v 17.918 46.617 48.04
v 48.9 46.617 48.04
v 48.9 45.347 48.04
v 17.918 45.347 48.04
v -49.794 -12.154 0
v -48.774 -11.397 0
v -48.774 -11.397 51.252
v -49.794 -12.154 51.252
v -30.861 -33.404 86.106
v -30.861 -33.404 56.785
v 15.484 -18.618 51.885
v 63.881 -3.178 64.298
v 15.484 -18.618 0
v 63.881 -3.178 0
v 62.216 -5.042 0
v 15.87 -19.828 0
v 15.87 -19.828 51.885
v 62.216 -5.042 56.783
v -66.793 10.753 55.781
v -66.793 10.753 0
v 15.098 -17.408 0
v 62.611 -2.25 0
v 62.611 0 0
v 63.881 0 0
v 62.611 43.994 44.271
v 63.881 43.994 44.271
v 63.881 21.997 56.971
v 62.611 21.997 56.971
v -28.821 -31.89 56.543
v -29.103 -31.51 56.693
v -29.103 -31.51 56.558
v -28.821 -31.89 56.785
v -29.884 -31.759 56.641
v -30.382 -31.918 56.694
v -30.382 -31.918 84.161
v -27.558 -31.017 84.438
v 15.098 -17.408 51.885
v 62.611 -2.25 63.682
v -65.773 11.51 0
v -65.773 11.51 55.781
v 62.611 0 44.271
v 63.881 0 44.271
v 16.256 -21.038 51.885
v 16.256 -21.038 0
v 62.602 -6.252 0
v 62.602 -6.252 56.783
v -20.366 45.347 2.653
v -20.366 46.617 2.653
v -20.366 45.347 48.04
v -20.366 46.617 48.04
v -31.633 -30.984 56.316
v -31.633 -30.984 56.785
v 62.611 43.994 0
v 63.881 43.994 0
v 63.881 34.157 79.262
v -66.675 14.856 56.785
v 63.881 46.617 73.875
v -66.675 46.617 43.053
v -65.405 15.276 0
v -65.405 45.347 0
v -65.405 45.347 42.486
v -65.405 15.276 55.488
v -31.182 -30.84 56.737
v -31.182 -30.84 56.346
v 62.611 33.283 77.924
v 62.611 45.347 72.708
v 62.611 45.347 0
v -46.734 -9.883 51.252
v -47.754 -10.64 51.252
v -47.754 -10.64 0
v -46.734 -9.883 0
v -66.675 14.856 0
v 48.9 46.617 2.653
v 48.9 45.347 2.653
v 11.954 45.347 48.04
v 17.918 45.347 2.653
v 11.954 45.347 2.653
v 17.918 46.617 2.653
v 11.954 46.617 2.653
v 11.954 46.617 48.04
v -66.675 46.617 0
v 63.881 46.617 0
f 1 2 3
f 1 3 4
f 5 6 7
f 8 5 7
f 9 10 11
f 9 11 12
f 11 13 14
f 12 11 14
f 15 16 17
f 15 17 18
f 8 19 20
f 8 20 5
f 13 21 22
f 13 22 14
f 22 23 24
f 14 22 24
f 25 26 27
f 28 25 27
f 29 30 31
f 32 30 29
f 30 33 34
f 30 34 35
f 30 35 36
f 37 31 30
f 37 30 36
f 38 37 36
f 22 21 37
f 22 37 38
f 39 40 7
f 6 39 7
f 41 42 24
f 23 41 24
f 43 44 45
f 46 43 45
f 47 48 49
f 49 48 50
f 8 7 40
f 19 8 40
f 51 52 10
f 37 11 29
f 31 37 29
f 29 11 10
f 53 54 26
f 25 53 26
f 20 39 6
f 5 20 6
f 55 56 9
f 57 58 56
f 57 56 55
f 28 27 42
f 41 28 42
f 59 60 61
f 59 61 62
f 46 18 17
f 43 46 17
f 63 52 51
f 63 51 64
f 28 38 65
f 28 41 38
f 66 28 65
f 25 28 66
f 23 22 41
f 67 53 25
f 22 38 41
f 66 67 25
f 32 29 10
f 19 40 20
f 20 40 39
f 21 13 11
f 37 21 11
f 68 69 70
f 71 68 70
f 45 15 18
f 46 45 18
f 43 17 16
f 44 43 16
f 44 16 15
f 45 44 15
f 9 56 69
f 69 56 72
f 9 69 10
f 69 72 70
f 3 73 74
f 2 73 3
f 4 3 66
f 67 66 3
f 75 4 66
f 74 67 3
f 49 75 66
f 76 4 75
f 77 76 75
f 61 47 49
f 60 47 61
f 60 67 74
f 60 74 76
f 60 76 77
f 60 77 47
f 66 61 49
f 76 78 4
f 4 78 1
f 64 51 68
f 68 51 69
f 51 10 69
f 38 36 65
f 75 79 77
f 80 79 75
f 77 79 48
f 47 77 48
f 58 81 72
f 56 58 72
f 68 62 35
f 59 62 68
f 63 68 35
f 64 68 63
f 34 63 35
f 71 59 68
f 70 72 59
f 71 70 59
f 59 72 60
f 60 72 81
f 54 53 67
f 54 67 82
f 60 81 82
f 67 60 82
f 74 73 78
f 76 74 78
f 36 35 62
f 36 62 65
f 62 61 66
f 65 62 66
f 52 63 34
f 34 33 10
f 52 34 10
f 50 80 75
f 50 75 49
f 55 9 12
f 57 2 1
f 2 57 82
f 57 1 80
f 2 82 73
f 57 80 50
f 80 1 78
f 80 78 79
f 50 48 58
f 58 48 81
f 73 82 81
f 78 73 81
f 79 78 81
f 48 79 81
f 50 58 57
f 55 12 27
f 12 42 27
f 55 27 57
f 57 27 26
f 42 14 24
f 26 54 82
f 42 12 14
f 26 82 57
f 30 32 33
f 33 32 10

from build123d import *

# Parameters (mm, degrees)
F1_DEPTH  = 86.106
F6_W      = 240.2444779873
F6_H      = 147.931613028
F7_DEPTH  = 60.706
F10_W     = 135.2960467339
F10_H     = 94.6298297495
F11_DEPTH = 41.148
F13_T     = -1.27
F14_DEPTH = 2.54
F16_DEPTH = 2.54
F18_DEPTH = 2.54
F19_W     = 30.9821236879
F19_H     = 45.3865022864
F19_W_2   = 32.3204575107
F20_DEPTH = 2.54
F23_START = 1.27
F23_DEPTH = 1.27
F25_START = 1.27
F25_DEPTH = 1.27


# Not quite as in the source:
# - the program builds the solid bodies; features that only make, move or delete a surface that nothing else refers to are left out


with BuildPart() as f1:
    # F0 (on Top) → F1 (new body)
    with BuildSketch(Plane.XY):
        Polygon((63.8810023665, 46.616720651), (-66.6749998927, 46.616720651), (-66.6749998927, 14.8563552648), (-30.8609995991, -33.4036462009), (63.8810023665, -3.1776451506), align=None)
    extrude(amount=F1_DEPTH)

    # F6 (on 3pt) + F3 (on face) → F7 (cut)
    with BuildSketch(Plane(origin=(-14.9985821509, 27.4688705788, 63.5316546184), x_dir=(0.9773177277, 0.084046153, 0.1943869934), z_dir=(-0.2117783252, 0.387857422, 0.897059954))):
        with Locations((-7.4320882559, 3.8242153823)):
            Rectangle(F6_W, F6_H)
    with BuildSketch(Plane(origin=(0, 46.616720651, 0), x_dir=(-1, 0, 0), z_dir=(0, 1, 0))):
        Polygon((-63.8810023665, 86.106), (-63.8810023665, 62.2684090482), (-14.7184757516, 62.2684090482), (66.6749998927, 62.2684090482), (66.6749998927, 86.106), align=None)
    extrude(amount=F7_DEPTH, dir=(-0.2117783252, 0.387857422, 0.897059954), mode=Mode.SUBTRACT)

    # F10 (on 3pt) → F11 (cut)
    with BuildSketch(Plane(origin=(24.5709511473, -27.5043865165, 68.6225243158), x_dir=(0.9489607702, 0.1173380711, -0.2927545622), z_dir=(0.315394129, -0.3530478726, 0.8808426324))):
        with Locations((4.6633481979, 24.4434149936)):
            Rectangle(F10_W, F10_H)
    extrude(amount=F11_DEPTH, mode=Mode.SUBTRACT)

    # F13
    f13_openings = [f1.faces().sort_by_distance(p)[0] for p in [
        (-1.661142, 14.401339, 0),
    ]]
    offset(amount=F13_T, openings=f13_openings)

    # F12 (on face) → F14 (cut)
    with BuildSketch(Plane(origin=(-35.8865647103, -26.6316079577, 0), x_dir=(0.5959348457, -0.8030327886, 0), z_dir=(-0.8030327886, -0.5959348457, 0))):
        Polygon((-19.9140961726, 51.251806932), (-19.9140961726, 0), (8.4330781245, 0), (8.4330781245, 56.7850737445), align=None)
    extrude(amount=-F14_DEPTH, mode=Mode.SUBTRACT)

    # F15 (on face) → F16 (cut)
    with BuildSketch(Plane(origin=(6.8214823825, -21.38162095, 0), x_dir=(0.9526906855, 0.3039415366, 0), z_dir=(0.3039415366, -0.9526906855, 0))):
        Polygon((9.0930175873, 51.884541691), (-39.55374242, 56.7850737445), (-39.55374242, 0), (9.0930175873, 0), align=None)
    extrude(amount=-F16_DEPTH, mode=Mode.SUBTRACT)

    # F17 (on face) → F18 (cut)
    with BuildSketch(Plane.YZ.offset(63.8810023665)):
        Polygon((0, 44.2713387311), (0, 0), (43.9940905122, 0), (43.9940905122, 44.2713387311), (21.9970452561, 56.9713387311), align=None)
    extrude(amount=-F18_DEPTH, mode=Mode.SUBTRACT)

    # F19 (on face) → F20 (cut)
    with BuildSketch(Plane(origin=(0, 46.616720651, 0), x_dir=(-1, 0, 0), z_dir=(0, 1, 0))):
        with Locations((-33.4093561396, 25.3466918366)):
            Rectangle(F19_W, F19_H)
        with Locations((4.2059472762, 25.3466918366)):
            Rectangle(F19_W_2, F19_H)
    extrude(amount=-F20_DEPTH, mode=Mode.SUBTRACT)


with BuildPart() as f23:
    # F22 (on face) → F23 (new body)
    with BuildSketch(Plane(origin=(6.8214823825, -21.38162095, 0), x_dir=(0.9526906855, 0.3039415366, 0), z_dir=(0.3039415366, -0.9526906855, 0)).offset(F23_START)):
        Polygon((57.7399830757, 56.7830335389), (9.0930175873, 51.884541691), (9.0930175873, 0), (57.7399830757, 0), align=None)
    extrude(amount=F23_DEPTH)


with BuildPart() as f25:
    # F24 (on face) → F25 (new body)
    with BuildSketch(Plane(origin=(-35.8865647103, -26.6316079577, 0), x_dir=(0.5959348457, -0.8030327886, 0), z_dir=(-0.8030327886, -0.5959348457, 0)).offset(F25_START)):
        Polygon((-19.9140961726, 0), (-19.9140961726, 51.251806932), (-48.4388518792, 55.7814475499), (-48.4388518792, 0), align=None)
    extrude(amount=F25_DEPTH)


solid = Compound([f1.part, f23.part, f25.part])
